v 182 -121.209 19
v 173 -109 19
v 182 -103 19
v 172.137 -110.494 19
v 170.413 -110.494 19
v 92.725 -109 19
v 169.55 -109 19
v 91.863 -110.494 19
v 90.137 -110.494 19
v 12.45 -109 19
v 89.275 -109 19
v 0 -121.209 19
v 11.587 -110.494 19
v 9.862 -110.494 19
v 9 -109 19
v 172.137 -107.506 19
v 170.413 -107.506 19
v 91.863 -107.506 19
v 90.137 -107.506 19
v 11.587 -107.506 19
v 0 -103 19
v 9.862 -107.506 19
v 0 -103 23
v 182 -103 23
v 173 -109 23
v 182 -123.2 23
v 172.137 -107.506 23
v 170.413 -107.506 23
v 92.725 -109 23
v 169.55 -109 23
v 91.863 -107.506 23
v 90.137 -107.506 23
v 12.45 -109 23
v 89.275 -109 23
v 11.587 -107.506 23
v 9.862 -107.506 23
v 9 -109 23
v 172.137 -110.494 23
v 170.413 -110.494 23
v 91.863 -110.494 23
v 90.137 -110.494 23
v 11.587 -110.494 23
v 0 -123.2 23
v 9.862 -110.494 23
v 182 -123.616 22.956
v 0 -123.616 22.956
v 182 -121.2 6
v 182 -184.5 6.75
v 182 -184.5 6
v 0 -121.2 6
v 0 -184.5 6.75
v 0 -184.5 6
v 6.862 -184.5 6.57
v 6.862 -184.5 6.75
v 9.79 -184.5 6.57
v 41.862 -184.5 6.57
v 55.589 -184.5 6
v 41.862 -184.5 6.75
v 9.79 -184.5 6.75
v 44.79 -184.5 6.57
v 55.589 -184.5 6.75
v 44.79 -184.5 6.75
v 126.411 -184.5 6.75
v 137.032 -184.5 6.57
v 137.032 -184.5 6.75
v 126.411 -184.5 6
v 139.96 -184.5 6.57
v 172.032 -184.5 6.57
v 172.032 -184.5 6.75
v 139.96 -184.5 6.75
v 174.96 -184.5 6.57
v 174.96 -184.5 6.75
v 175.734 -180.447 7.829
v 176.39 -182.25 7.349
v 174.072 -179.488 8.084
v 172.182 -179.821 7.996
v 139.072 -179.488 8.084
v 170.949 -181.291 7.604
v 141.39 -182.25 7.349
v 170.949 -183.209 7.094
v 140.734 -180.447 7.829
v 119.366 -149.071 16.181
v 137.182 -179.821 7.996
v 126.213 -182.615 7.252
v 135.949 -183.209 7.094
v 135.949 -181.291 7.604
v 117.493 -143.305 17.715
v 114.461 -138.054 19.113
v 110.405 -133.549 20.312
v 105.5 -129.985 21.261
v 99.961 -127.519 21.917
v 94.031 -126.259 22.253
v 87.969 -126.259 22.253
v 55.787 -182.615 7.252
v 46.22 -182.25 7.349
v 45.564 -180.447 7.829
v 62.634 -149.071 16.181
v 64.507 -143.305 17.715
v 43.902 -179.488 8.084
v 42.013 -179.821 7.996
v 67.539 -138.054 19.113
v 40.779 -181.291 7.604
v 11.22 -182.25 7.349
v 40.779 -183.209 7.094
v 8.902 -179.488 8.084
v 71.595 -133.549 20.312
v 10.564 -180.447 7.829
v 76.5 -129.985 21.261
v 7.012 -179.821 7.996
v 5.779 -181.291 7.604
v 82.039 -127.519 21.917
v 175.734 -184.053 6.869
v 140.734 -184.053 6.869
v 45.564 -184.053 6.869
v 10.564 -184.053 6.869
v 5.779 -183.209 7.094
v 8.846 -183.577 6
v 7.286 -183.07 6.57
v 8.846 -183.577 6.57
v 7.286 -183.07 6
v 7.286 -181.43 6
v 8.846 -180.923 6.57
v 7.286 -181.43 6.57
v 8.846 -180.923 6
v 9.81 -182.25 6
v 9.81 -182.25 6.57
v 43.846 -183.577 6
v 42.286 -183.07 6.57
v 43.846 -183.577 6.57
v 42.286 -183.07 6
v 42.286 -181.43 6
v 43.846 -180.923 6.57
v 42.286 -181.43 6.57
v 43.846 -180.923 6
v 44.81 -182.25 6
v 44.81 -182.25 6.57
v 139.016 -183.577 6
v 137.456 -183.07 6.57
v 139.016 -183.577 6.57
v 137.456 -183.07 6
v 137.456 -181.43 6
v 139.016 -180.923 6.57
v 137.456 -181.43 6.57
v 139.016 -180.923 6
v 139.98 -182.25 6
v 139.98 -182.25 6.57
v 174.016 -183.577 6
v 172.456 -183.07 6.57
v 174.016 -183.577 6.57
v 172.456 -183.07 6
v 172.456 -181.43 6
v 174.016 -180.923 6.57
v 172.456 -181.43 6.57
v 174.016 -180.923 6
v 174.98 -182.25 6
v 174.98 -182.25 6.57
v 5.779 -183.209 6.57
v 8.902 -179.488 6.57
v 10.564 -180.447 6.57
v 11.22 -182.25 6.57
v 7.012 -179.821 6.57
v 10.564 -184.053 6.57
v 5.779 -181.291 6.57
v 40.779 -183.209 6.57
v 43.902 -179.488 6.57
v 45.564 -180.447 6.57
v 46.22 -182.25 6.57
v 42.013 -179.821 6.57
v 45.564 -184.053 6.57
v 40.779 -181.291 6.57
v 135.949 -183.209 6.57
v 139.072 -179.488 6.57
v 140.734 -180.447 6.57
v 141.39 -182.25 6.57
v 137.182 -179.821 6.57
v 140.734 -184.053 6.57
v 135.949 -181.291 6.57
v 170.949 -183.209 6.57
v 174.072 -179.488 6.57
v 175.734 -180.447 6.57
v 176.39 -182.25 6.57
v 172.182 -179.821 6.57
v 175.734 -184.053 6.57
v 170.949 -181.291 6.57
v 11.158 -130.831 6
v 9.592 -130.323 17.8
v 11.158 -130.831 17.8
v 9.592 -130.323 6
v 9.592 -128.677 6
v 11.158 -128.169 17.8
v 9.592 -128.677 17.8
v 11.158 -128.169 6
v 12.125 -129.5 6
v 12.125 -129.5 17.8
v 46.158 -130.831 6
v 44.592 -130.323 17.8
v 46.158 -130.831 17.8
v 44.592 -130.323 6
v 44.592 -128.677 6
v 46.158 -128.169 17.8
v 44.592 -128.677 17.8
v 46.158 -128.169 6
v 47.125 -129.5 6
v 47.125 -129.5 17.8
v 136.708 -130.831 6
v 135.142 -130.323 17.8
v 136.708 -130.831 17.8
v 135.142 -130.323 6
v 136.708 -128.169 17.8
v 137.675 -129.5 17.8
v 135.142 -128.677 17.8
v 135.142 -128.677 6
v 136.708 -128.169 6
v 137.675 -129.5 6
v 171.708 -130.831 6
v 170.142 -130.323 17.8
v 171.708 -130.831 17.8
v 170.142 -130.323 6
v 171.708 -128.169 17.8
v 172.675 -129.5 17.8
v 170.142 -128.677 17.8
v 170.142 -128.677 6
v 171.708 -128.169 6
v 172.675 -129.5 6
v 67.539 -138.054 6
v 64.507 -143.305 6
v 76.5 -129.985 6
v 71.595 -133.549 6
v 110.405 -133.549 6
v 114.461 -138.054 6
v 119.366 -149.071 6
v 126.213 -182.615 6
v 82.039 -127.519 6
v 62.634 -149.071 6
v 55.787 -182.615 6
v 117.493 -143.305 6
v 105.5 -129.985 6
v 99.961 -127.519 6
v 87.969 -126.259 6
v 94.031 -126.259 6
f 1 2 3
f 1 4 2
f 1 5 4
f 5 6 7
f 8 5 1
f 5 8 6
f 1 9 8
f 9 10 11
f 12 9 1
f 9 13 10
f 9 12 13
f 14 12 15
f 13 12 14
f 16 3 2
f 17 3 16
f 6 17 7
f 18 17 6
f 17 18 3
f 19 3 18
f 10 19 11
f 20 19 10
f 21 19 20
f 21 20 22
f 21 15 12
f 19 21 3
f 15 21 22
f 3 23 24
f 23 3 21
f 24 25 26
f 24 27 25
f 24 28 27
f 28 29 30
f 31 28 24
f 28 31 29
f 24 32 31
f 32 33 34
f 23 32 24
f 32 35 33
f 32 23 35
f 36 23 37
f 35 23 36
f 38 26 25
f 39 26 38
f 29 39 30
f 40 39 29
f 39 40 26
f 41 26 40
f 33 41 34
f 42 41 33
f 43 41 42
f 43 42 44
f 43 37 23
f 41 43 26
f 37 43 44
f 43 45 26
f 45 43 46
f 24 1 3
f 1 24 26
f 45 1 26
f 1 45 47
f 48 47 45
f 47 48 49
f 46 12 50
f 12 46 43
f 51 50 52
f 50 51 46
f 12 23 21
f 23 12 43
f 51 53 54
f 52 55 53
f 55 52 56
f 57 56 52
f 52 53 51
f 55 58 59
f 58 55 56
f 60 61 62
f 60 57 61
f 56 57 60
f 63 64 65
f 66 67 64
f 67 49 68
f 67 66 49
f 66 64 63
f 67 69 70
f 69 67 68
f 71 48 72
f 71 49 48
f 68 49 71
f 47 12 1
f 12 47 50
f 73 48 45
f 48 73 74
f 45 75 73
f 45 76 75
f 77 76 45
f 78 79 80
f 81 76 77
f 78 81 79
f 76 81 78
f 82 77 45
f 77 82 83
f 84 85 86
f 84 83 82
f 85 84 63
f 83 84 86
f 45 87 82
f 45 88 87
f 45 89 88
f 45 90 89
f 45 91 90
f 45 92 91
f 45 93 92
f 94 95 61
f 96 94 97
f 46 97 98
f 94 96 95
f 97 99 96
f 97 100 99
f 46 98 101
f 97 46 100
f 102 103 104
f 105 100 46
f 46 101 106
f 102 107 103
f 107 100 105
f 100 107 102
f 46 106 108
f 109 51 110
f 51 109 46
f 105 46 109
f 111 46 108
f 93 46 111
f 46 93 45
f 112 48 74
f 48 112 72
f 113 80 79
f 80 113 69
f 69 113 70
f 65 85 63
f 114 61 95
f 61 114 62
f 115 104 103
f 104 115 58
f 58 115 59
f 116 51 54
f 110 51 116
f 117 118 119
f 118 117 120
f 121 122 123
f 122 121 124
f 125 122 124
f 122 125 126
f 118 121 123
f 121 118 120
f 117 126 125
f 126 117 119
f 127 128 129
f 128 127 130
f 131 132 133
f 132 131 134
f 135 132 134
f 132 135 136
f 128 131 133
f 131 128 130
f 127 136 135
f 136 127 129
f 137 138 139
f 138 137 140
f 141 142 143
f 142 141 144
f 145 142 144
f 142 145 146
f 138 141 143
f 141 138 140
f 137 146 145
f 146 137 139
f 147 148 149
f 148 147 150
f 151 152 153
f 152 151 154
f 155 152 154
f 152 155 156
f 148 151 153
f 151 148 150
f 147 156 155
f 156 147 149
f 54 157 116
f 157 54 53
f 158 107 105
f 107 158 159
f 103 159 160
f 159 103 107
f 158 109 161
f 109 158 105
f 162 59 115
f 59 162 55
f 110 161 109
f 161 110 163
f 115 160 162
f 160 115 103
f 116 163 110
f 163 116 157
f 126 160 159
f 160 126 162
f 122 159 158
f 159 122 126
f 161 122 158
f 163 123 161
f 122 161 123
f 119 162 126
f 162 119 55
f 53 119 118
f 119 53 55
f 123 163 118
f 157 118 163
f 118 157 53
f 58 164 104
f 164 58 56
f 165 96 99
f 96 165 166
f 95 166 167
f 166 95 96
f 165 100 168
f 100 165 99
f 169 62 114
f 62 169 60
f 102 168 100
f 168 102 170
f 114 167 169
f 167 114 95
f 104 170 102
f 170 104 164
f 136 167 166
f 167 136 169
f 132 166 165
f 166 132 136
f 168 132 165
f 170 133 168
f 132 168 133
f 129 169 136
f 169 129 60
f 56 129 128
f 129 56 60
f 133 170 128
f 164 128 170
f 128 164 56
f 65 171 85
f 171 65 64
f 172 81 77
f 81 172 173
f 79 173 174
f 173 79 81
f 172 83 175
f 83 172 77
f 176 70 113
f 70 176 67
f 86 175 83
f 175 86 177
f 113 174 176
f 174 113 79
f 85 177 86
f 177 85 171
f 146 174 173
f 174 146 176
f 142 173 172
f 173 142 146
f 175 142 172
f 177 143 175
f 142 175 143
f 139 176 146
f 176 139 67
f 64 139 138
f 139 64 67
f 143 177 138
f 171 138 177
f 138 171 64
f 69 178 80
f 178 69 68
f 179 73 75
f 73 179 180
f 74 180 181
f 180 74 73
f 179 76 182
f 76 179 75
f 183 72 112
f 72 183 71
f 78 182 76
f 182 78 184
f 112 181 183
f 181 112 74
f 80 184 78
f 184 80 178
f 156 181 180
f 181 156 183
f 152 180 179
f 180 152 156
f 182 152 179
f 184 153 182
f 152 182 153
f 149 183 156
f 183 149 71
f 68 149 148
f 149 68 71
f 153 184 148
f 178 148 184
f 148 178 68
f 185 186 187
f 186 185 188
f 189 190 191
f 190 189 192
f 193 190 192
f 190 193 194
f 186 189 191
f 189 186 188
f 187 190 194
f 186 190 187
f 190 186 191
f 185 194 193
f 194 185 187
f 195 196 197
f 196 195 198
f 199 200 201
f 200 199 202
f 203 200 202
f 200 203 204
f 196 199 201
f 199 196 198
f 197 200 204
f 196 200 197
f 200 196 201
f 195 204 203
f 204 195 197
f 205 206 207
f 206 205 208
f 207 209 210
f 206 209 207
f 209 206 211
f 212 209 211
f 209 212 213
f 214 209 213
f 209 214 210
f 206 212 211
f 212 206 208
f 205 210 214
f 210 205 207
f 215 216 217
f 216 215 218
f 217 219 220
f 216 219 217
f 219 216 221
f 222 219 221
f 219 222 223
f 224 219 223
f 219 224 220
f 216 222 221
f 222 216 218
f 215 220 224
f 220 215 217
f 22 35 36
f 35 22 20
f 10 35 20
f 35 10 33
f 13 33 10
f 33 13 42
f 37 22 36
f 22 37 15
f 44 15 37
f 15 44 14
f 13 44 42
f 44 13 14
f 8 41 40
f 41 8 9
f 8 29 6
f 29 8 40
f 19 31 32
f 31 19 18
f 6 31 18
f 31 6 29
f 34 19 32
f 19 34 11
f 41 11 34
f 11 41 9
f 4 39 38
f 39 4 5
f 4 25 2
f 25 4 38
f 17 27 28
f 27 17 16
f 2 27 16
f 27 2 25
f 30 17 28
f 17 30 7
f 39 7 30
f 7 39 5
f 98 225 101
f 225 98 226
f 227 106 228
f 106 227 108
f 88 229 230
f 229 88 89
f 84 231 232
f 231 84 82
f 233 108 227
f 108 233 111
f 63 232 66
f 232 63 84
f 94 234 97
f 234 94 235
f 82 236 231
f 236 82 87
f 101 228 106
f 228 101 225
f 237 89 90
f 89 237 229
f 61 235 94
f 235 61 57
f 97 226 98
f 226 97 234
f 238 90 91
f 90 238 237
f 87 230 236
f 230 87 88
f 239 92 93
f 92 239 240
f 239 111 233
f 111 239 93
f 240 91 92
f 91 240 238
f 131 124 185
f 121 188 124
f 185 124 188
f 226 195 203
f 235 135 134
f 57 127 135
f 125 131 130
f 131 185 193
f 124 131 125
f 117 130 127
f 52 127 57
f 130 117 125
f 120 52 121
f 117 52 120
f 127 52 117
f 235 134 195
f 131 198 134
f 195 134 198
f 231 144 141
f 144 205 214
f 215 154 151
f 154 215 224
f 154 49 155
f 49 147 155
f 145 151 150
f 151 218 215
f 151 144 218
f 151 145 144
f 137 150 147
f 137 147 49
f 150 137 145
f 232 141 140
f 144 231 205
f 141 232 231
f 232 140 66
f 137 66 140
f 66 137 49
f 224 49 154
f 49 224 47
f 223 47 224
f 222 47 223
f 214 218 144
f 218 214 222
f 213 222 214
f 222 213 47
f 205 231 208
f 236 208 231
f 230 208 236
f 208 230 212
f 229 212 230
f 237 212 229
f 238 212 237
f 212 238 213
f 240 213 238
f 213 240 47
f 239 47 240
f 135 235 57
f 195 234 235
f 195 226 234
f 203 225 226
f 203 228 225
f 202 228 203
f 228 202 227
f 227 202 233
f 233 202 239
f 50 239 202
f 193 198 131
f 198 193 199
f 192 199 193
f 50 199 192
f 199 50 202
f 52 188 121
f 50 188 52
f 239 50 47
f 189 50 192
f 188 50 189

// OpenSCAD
// file: stripperPlate.scad
include<params.scad>;
use<carriageScrews.scad>;

module stripperPlate(col = "blue") {
    $fn = 50;
    color(col)
    hull() {
        // outer L
        translate([-CAM_PLATE_WIDTH/2,NEEDLE_EXTENSION-4,-camPlateHeight])
         sphere(d = camPlateHeight/2);
        
        // mid L
         translate([-camPlateHeight * 2.5,NEEDLE_EXTENSION-camPlateHeight/2,-camPlateHeight])
         sphere(d = camPlateHeight/2);
        
        // inner L
        translate([-camPlateHeight * 1.5 - 0.5,NEEDLE_EXTENSION-camPlateHeight * 1.5 -2,-camPlateHeight])
         cylinder(h = camPlateHeight/2, d = camPlateHeight*3, center = true);
        
//        front rounded edge
        translate([-CAM_PLATE_WIDTH/2 + 55/2, -(camPlateHeight)/2, -(camPlateHeight + 1)/2])
    rotate([0,90,0])
        cylinder(55, d = camPlateHeight + 1, center = true, $fn = 30);
    }
}

//stripperPlate("lime");

module stripperPlateNose() {
    color("blue")
    hull () {
//        translate([0, -(camPlateHeight)/2, -(camPlateHeight + 1)/2])
//        rotate([0,90,0])
//        cylinder(CAM_PLATE_WIDTH, d = camPlateHeight + 1, center = true, $fn = 30);
        
        translate([-CAM_PLATE_WIDTH/2 + 55/2, -(camPlateHeight)/2, -(camPlateHeight + 1)/2])
    rotate([0,90,0])
        cylinder(55, d = camPlateHeight + 1, center = true, $fn = 30);
    
        
        // line up with front edge of yarn carrier
        translate([-CAM_PLATE_WIDTH/2 + 55/2,-(camPlateHeight + 1.5),needleSlotHeight + 2])
        rotate([0,90,0])
        cylinder(55, d = needleSlotHeight + 2.5, center = true, $fn = 50);
    }
}

module yarnCarrierCutout() {
        hull() {
//            translate([CAM_PLATE_WIDTH/2,0,0])
//            yarnFeeder();
            
            // back
            translate([CAM_PLATE_WIDTH/2,YARN_DEPOSIT_Y,(camHeight + camPlateHeight*2)])
            cylinder(h = 40, r = 29, center = true);
             
         // wide cone front   
            translate([CAM_PLATE_WIDTH/2,YARN_DEPOSIT_Y - 35,(camHeight + camPlateHeight)/2])
            cylinder(h = camHeight + camPlateHeight, r = (CAM_PLATE_WIDTH - 55*2)/2, center = true);
                
//            // small frontmost
//            translate([CAM_PLATE_WIDTH/2,YARN_DEPOSIT_Y - 35,-camPlateHeight])
//            cylinder(h = camHeight + camPlateHeight*2, r = 10, center = true);
        }
}


    difference() {
        translate([CAM_PLATE_WIDTH/2,-NEEDLE_BED_DEPTH - NEEDLE_EXTENSION - tolerance * 2,-needleSlotHeight]) {
            union() {
                stripperPlate();
                stripperPlateNose();
            }
        }
        translate([-1,-tolerance, -tolerance])
        // flat edge
        translate([0,-(NEEDLE_BED_DEPTH + NEEDLE_EXTENSION + camPlateHeight + 2), 2])
        cube([CAM_PLATE_WIDTH + 4, camPlateHeight + 2, camPlateHeight + 2], center = false);
        
        
        yarnCarrierCutout();
        
        carriageScrews();
    }
    
    translate([CAM_PLATE_WIDTH, 0, 0])
    mirror([1,0,0])
    difference() {
        translate([CAM_PLATE_WIDTH/2,-NEEDLE_BED_DEPTH - NEEDLE_EXTENSION - tolerance * 2,-needleSlotHeight]) {
            union() {
                stripperPlate();
                stripperPlateNose();
            }
        }
        translate([-1,-tolerance, -tolerance])
        // flat edge
        translate([0,-(NEEDLE_BED_DEPTH + NEEDLE_EXTENSION + camPlateHeight + 2), 2])
        cube([CAM_PLATE_WIDTH + 4, camPlateHeight + 2, camPlateHeight + 2], center = false);
        
        
        yarnCarrierCutout();
        
        carriageScrews();
    }
// file: carriageScrews.scad
include<params.scad>;

module carriageScrews() {
    
    // attach to back of camplate
    translate([screwHeadDiam*1.5,-6,camHeight + camPlateHeight/2]) 
    #cylinder(h= 12*2, d = screwDiam, center = true);
    
    translate([CAM_PLATE_WIDTH/2,-6,camHeight + camPlateHeight/2]) 
    #cylinder(h= 12*2, d = screwDiam, center = true);
    
    translate([CAM_PLATE_WIDTH - screwHeadDiam*1.5,-6,camHeight + camPlateHeight/2]) 
    #cylinder(h= 12*2, d = screwDiam, center = true);

    // attach to front of camplate
    translate([screwHeadDiam*1.5,-(NEEDLE_BED_DEPTH - COMB - 6),camHeight + camPlateHeight/2]) 
    #cylinder(h= 12*2, d = screwDiam, center = true);
    
    translate([CAM_PLATE_WIDTH/2,-(NEEDLE_BED_DEPTH - COMB - 6),camHeight + camPlateHeight/2]) 
    #cylinder(h= 12*2, d = screwDiam, center = true);
    
    translate([CAM_PLATE_WIDTH - screwHeadDiam*1.5,-(NEEDLE_BED_DEPTH - COMB - 6),camHeight + camPlateHeight/2]) 
    #cylinder(h= 12*2, d = screwDiam, center = true);
    
    // attach stripper plate 
    // this spot is tiny so we need to use smaller (#4) screws for this!
    translate([0,-(NEEDLE_BED_DEPTH + NEEDLE_EXTENSION + camPlateHeight - 0.25),0]) {
        // screw hole
        translate([0,0,2]) {
    
            translate([screwHeadDiamSm*1.5,0,0])
            #cylinder(h= screwHeightSm, d = screwDiamSm, center = true);
            
            translate([screwHeadDiamSm*1.5 + 35,0,0])
            #cylinder(h= screwHeightSm, d = screwDiamSm, center = true);
            
            translate([CAM_PLATE_WIDTH - screwHeadDiamSm*1.5 - 35,0,0])
            #cylinder(h= screwHeightSm, d = screwDiamSm, center = true);
            
            translate([CAM_PLATE_WIDTH - screwHeadDiamSm*1.5,0,0])
            #cylinder(h= screwHeightSm, d = screwDiamSm, center = true);
        
        }
        // countersink
        translate([0,0,6.5 + screwHeadHeight/2]) {
            
            translate([screwHeadDiamSm*1.5,0,0])
            #cylinder(h= screwHeadHeightSm, d = screwHeadDiamSm, center = true);
 
            translate([screwHeadDiamSm*1.5 + 35,0,0])
            #cylinder(h= screwHeadHeightSm, d = screwHeadDiamSm, center = true);

            translate([CAM_PLATE_WIDTH - screwHeadDiamSm*1.5 -35,0,0])
            #cylinder(h= screwHeadHeightSm, d = screwHeadDiamSm, center = true);

            translate([CAM_PLATE_WIDTH - screwHeadDiamSm*1.5,0,0])
            #cylinder(h= screwHeadHeightSm, d = screwHeadDiamSm, center = true);
        }
    }         
    
    // attach yarn feeder plate from underneath
    
    translate([0,-(NEEDLE_BED_DEPTH - COMB/2),0]) {
        
        translate([0,0,2 - tolerance]) {
            // screw holes
            translate([screwHeadDiam*1.5,0,0])
            #cylinder(h= screwHeight-2, d = 2.8, center = false);
            
            translate([screwHeadDiam*1.5 + 35,0,0])
            #cylinder(h= screwHeight-2, d = 2.8, center = false);
            
            translate([CAM_PLATE_WIDTH - screwHeadDiam*1.5 - 35,0,0])
            #cylinder(h= screwHeight-2, d = 2.8, center = false);
            
            translate([CAM_PLATE_WIDTH - screwHeadDiam*1.5,0,0])
            #cylinder(h= screwHeight-2, d = 2.8, center = false);
        
        
            // countersink
            translate([screwHeadDiam*1.5,0,0])
            #cylinder(h= screwHeadHeight + tolerance, d = screwHeadDiam, center = false);
 
            translate([screwHeadDiam*1.5 + 35,0,0])
            #cylinder(h= screwHeadHeight + tolerance, d = screwHeadDiam, center = false);

            translate([CAM_PLATE_WIDTH - screwHeadDiam*1.5 -35,0,0])
            #cylinder(h= screwHeadHeight + tolerance, d = screwHeadDiam, center = false);

            translate([CAM_PLATE_WIDTH - screwHeadDiam*1.5,0,0])
            #cylinder(h= screwHeadHeight + tolerance, d = screwHeadDiam, center = false);
        }
    }              
}
// file: params.scad
/*

Values in `camelCase` are user-variable (within reason); 
values like numNeedles and screwDiam, etc.,  can be modified to
accommodate user preference or hardware subsitution. 

Values in `ALL_CAPS` should be considered CONSTANTS and should
only be modified with *extreme caution* as they will affect the 
relationship between the needles and the cams, which could
prevent stitches from forming correctly.

I recommend only modifying these constants if you are also 
making changes to the cam design in the technical sketch.
*/

gauge = 4.5;
numNeedles = 25;
tolerance = 0.2; // allows a bit of room for parts that have to fit together; adjust according to your printer's precision

// ---
// Hardware dimensions 
// (actual measurements, no tolerances)

// - pan head 6-32 machine screws
screwDiam = 3.45;
screwHeight = 18;
screwHeadDiam = 6.75 + tolerance * 2; 
screwHeadHeight = 2.55 + tolerance * 2;
nutWidth = 7.9;
nutHeight = 2.8;

// - pan head 4-40 machine screws
screwDiamSm = 2.79;
screwHeightSm = 14.62;
screwHeadHeightSm = 2.41 + tolerance * 2;
screwHeadDiamSm = 5.21 + tolerance * 2;

// TODO: look for metric hardware alternatives while abroad 

// ---
// Needle dimensions
// - Brother needles
BUTT_HEIGHT = 15;
NEEDLE_WIDTH = 1.25;
NEEDLE_LEG_HEIGHT = 1.85;
HOOK_DIAM = 3.5;

// ---
// Needle Bed Zones
BACK_COVER = 45;
OOW_TRACK = 8;
B_TRACK = 42; // will divvy up working tracks (B & C position) later
C_TRACK = 0;
WORKING_TRACK = B_TRACK + C_TRACK;
HOLD_TRACK = 8;
SPONGE_BAR = 12;
COMB = 29;
NEEDLE_EXTENSION = 34.5;

// ---
// Needle bed dimensions
NEEDLE_BED_DEPTH = BACK_COVER + OOW_TRACK + WORKING_TRACK + HOLD_TRACK + SPONGE_BAR + COMB;
needleBedHeight = screwHeight + 2;
needleSlotHeight = NEEDLE_LEG_HEIGHT * 2 + screwHeadHeight;
needleSlotWidth = NEEDLE_WIDTH + 0.25; // add a small amount of clearance
combWidth = gauge*2/3; // width of cutouts for stitch formation; this gives room for the thickness of the yarn looped around the needle when it pulls back into the slot, but has to balance leaving enough material for the remaining "teeth" to not be too fragile
spongeThickness = 2.5;
spongeBarThickness = needleSlotHeight - NEEDLE_LEG_HEIGHT - spongeThickness;
YARN_DEPOSIT_Y = -155.1;
YARN_DEPOSIT_Z = -needleSlotHeight + HOOK_DIAM;
connectorOffset = 20;

screwPlacement = 3; // how many needles from edge of bed; min 2, max floor(numNeedles/2)

// ---
// Carriage dimensions
// refer to technical sketch
camHeight = BUTT_HEIGHT; // thickness of the tracks the needles ride along
camPlateHeight = 4; // plate behind the cams
CAM_PLATE_WIDTH = 91 * 2; 
CAM_PLATE_DEPTH = NEEDLE_BED_DEPTH - COMB + 6;

railDepth = 8;
railHeight = 8; // ???
xOffset = 16.5;
//vCamScrews = [[34-xOffset, -90.25, 0],[58-xOffset, -74.25, 0],[86-xOffset,-90.25, 0]];
// main file
include<params.scad>;
use<carriageScrews.scad>;
use<stripperPlate.scad>;

difference() {
    color("orchid", 0.5)
    
    yarnCarrierCover();
    yarnCarrierCutout();
    translate([CAM_PLATE_WIDTH/2,YARN_DEPOSIT_Y + 2 + tolerance,camPlateHeight/2 + 1])
    cube([CAM_PLATE_WIDTH + 2, (NEEDLE_BED_DEPTH + NEEDLE_EXTENSION + camPlateHeight*1.5)-(NEEDLE_BED_DEPTH - COMB + 6 + tolerance) + 2, camPlateHeight + 2], center = true);        
    carriageScrews();
    
}

module yarnCarrierCover() {
    hull() {
        // main
        translate([0,-(NEEDLE_BED_DEPTH - COMB + 6),camHeight + camPlateHeight])
        cube([CAM_PLATE_WIDTH, SPONGE_BAR + 6, camPlateHeight]);
        // rounded edge
        translate([CAM_PLATE_WIDTH/2,-(NEEDLE_BED_DEPTH - COMB + 6 + tolerance + camPlateHeight/2),camHeight + camPlateHeight * 1.5])
        rotate([0,90,0])
        cylinder(CAM_PLATE_WIDTH, d = camPlateHeight, center = true, $fn = 30);
    }
    
    hull() {
        // overhang
        translate([0,-(NEEDLE_BED_DEPTH),2])
        cube([CAM_PLATE_WIDTH, COMB - 6 - tolerance, camPlateHeight]);
        
        // rounded edge
        translate([CAM_PLATE_WIDTH/2,-(NEEDLE_BED_DEPTH - COMB + 6 + tolerance + camPlateHeight/2),camHeight + camPlateHeight * 1.5])
        rotate([0,90,0])
        cylinder(CAM_PLATE_WIDTH, d = camPlateHeight, center = true, $fn = 30);
        
        // flat edge
        translate([CAM_PLATE_WIDTH/2,-(NEEDLE_BED_DEPTH + NEEDLE_EXTENSION + camPlateHeight),camPlateHeight/2 + 2.25])
        cube([CAM_PLATE_WIDTH, camPlateHeight, camPlateHeight+1], center = true);
    }
}
